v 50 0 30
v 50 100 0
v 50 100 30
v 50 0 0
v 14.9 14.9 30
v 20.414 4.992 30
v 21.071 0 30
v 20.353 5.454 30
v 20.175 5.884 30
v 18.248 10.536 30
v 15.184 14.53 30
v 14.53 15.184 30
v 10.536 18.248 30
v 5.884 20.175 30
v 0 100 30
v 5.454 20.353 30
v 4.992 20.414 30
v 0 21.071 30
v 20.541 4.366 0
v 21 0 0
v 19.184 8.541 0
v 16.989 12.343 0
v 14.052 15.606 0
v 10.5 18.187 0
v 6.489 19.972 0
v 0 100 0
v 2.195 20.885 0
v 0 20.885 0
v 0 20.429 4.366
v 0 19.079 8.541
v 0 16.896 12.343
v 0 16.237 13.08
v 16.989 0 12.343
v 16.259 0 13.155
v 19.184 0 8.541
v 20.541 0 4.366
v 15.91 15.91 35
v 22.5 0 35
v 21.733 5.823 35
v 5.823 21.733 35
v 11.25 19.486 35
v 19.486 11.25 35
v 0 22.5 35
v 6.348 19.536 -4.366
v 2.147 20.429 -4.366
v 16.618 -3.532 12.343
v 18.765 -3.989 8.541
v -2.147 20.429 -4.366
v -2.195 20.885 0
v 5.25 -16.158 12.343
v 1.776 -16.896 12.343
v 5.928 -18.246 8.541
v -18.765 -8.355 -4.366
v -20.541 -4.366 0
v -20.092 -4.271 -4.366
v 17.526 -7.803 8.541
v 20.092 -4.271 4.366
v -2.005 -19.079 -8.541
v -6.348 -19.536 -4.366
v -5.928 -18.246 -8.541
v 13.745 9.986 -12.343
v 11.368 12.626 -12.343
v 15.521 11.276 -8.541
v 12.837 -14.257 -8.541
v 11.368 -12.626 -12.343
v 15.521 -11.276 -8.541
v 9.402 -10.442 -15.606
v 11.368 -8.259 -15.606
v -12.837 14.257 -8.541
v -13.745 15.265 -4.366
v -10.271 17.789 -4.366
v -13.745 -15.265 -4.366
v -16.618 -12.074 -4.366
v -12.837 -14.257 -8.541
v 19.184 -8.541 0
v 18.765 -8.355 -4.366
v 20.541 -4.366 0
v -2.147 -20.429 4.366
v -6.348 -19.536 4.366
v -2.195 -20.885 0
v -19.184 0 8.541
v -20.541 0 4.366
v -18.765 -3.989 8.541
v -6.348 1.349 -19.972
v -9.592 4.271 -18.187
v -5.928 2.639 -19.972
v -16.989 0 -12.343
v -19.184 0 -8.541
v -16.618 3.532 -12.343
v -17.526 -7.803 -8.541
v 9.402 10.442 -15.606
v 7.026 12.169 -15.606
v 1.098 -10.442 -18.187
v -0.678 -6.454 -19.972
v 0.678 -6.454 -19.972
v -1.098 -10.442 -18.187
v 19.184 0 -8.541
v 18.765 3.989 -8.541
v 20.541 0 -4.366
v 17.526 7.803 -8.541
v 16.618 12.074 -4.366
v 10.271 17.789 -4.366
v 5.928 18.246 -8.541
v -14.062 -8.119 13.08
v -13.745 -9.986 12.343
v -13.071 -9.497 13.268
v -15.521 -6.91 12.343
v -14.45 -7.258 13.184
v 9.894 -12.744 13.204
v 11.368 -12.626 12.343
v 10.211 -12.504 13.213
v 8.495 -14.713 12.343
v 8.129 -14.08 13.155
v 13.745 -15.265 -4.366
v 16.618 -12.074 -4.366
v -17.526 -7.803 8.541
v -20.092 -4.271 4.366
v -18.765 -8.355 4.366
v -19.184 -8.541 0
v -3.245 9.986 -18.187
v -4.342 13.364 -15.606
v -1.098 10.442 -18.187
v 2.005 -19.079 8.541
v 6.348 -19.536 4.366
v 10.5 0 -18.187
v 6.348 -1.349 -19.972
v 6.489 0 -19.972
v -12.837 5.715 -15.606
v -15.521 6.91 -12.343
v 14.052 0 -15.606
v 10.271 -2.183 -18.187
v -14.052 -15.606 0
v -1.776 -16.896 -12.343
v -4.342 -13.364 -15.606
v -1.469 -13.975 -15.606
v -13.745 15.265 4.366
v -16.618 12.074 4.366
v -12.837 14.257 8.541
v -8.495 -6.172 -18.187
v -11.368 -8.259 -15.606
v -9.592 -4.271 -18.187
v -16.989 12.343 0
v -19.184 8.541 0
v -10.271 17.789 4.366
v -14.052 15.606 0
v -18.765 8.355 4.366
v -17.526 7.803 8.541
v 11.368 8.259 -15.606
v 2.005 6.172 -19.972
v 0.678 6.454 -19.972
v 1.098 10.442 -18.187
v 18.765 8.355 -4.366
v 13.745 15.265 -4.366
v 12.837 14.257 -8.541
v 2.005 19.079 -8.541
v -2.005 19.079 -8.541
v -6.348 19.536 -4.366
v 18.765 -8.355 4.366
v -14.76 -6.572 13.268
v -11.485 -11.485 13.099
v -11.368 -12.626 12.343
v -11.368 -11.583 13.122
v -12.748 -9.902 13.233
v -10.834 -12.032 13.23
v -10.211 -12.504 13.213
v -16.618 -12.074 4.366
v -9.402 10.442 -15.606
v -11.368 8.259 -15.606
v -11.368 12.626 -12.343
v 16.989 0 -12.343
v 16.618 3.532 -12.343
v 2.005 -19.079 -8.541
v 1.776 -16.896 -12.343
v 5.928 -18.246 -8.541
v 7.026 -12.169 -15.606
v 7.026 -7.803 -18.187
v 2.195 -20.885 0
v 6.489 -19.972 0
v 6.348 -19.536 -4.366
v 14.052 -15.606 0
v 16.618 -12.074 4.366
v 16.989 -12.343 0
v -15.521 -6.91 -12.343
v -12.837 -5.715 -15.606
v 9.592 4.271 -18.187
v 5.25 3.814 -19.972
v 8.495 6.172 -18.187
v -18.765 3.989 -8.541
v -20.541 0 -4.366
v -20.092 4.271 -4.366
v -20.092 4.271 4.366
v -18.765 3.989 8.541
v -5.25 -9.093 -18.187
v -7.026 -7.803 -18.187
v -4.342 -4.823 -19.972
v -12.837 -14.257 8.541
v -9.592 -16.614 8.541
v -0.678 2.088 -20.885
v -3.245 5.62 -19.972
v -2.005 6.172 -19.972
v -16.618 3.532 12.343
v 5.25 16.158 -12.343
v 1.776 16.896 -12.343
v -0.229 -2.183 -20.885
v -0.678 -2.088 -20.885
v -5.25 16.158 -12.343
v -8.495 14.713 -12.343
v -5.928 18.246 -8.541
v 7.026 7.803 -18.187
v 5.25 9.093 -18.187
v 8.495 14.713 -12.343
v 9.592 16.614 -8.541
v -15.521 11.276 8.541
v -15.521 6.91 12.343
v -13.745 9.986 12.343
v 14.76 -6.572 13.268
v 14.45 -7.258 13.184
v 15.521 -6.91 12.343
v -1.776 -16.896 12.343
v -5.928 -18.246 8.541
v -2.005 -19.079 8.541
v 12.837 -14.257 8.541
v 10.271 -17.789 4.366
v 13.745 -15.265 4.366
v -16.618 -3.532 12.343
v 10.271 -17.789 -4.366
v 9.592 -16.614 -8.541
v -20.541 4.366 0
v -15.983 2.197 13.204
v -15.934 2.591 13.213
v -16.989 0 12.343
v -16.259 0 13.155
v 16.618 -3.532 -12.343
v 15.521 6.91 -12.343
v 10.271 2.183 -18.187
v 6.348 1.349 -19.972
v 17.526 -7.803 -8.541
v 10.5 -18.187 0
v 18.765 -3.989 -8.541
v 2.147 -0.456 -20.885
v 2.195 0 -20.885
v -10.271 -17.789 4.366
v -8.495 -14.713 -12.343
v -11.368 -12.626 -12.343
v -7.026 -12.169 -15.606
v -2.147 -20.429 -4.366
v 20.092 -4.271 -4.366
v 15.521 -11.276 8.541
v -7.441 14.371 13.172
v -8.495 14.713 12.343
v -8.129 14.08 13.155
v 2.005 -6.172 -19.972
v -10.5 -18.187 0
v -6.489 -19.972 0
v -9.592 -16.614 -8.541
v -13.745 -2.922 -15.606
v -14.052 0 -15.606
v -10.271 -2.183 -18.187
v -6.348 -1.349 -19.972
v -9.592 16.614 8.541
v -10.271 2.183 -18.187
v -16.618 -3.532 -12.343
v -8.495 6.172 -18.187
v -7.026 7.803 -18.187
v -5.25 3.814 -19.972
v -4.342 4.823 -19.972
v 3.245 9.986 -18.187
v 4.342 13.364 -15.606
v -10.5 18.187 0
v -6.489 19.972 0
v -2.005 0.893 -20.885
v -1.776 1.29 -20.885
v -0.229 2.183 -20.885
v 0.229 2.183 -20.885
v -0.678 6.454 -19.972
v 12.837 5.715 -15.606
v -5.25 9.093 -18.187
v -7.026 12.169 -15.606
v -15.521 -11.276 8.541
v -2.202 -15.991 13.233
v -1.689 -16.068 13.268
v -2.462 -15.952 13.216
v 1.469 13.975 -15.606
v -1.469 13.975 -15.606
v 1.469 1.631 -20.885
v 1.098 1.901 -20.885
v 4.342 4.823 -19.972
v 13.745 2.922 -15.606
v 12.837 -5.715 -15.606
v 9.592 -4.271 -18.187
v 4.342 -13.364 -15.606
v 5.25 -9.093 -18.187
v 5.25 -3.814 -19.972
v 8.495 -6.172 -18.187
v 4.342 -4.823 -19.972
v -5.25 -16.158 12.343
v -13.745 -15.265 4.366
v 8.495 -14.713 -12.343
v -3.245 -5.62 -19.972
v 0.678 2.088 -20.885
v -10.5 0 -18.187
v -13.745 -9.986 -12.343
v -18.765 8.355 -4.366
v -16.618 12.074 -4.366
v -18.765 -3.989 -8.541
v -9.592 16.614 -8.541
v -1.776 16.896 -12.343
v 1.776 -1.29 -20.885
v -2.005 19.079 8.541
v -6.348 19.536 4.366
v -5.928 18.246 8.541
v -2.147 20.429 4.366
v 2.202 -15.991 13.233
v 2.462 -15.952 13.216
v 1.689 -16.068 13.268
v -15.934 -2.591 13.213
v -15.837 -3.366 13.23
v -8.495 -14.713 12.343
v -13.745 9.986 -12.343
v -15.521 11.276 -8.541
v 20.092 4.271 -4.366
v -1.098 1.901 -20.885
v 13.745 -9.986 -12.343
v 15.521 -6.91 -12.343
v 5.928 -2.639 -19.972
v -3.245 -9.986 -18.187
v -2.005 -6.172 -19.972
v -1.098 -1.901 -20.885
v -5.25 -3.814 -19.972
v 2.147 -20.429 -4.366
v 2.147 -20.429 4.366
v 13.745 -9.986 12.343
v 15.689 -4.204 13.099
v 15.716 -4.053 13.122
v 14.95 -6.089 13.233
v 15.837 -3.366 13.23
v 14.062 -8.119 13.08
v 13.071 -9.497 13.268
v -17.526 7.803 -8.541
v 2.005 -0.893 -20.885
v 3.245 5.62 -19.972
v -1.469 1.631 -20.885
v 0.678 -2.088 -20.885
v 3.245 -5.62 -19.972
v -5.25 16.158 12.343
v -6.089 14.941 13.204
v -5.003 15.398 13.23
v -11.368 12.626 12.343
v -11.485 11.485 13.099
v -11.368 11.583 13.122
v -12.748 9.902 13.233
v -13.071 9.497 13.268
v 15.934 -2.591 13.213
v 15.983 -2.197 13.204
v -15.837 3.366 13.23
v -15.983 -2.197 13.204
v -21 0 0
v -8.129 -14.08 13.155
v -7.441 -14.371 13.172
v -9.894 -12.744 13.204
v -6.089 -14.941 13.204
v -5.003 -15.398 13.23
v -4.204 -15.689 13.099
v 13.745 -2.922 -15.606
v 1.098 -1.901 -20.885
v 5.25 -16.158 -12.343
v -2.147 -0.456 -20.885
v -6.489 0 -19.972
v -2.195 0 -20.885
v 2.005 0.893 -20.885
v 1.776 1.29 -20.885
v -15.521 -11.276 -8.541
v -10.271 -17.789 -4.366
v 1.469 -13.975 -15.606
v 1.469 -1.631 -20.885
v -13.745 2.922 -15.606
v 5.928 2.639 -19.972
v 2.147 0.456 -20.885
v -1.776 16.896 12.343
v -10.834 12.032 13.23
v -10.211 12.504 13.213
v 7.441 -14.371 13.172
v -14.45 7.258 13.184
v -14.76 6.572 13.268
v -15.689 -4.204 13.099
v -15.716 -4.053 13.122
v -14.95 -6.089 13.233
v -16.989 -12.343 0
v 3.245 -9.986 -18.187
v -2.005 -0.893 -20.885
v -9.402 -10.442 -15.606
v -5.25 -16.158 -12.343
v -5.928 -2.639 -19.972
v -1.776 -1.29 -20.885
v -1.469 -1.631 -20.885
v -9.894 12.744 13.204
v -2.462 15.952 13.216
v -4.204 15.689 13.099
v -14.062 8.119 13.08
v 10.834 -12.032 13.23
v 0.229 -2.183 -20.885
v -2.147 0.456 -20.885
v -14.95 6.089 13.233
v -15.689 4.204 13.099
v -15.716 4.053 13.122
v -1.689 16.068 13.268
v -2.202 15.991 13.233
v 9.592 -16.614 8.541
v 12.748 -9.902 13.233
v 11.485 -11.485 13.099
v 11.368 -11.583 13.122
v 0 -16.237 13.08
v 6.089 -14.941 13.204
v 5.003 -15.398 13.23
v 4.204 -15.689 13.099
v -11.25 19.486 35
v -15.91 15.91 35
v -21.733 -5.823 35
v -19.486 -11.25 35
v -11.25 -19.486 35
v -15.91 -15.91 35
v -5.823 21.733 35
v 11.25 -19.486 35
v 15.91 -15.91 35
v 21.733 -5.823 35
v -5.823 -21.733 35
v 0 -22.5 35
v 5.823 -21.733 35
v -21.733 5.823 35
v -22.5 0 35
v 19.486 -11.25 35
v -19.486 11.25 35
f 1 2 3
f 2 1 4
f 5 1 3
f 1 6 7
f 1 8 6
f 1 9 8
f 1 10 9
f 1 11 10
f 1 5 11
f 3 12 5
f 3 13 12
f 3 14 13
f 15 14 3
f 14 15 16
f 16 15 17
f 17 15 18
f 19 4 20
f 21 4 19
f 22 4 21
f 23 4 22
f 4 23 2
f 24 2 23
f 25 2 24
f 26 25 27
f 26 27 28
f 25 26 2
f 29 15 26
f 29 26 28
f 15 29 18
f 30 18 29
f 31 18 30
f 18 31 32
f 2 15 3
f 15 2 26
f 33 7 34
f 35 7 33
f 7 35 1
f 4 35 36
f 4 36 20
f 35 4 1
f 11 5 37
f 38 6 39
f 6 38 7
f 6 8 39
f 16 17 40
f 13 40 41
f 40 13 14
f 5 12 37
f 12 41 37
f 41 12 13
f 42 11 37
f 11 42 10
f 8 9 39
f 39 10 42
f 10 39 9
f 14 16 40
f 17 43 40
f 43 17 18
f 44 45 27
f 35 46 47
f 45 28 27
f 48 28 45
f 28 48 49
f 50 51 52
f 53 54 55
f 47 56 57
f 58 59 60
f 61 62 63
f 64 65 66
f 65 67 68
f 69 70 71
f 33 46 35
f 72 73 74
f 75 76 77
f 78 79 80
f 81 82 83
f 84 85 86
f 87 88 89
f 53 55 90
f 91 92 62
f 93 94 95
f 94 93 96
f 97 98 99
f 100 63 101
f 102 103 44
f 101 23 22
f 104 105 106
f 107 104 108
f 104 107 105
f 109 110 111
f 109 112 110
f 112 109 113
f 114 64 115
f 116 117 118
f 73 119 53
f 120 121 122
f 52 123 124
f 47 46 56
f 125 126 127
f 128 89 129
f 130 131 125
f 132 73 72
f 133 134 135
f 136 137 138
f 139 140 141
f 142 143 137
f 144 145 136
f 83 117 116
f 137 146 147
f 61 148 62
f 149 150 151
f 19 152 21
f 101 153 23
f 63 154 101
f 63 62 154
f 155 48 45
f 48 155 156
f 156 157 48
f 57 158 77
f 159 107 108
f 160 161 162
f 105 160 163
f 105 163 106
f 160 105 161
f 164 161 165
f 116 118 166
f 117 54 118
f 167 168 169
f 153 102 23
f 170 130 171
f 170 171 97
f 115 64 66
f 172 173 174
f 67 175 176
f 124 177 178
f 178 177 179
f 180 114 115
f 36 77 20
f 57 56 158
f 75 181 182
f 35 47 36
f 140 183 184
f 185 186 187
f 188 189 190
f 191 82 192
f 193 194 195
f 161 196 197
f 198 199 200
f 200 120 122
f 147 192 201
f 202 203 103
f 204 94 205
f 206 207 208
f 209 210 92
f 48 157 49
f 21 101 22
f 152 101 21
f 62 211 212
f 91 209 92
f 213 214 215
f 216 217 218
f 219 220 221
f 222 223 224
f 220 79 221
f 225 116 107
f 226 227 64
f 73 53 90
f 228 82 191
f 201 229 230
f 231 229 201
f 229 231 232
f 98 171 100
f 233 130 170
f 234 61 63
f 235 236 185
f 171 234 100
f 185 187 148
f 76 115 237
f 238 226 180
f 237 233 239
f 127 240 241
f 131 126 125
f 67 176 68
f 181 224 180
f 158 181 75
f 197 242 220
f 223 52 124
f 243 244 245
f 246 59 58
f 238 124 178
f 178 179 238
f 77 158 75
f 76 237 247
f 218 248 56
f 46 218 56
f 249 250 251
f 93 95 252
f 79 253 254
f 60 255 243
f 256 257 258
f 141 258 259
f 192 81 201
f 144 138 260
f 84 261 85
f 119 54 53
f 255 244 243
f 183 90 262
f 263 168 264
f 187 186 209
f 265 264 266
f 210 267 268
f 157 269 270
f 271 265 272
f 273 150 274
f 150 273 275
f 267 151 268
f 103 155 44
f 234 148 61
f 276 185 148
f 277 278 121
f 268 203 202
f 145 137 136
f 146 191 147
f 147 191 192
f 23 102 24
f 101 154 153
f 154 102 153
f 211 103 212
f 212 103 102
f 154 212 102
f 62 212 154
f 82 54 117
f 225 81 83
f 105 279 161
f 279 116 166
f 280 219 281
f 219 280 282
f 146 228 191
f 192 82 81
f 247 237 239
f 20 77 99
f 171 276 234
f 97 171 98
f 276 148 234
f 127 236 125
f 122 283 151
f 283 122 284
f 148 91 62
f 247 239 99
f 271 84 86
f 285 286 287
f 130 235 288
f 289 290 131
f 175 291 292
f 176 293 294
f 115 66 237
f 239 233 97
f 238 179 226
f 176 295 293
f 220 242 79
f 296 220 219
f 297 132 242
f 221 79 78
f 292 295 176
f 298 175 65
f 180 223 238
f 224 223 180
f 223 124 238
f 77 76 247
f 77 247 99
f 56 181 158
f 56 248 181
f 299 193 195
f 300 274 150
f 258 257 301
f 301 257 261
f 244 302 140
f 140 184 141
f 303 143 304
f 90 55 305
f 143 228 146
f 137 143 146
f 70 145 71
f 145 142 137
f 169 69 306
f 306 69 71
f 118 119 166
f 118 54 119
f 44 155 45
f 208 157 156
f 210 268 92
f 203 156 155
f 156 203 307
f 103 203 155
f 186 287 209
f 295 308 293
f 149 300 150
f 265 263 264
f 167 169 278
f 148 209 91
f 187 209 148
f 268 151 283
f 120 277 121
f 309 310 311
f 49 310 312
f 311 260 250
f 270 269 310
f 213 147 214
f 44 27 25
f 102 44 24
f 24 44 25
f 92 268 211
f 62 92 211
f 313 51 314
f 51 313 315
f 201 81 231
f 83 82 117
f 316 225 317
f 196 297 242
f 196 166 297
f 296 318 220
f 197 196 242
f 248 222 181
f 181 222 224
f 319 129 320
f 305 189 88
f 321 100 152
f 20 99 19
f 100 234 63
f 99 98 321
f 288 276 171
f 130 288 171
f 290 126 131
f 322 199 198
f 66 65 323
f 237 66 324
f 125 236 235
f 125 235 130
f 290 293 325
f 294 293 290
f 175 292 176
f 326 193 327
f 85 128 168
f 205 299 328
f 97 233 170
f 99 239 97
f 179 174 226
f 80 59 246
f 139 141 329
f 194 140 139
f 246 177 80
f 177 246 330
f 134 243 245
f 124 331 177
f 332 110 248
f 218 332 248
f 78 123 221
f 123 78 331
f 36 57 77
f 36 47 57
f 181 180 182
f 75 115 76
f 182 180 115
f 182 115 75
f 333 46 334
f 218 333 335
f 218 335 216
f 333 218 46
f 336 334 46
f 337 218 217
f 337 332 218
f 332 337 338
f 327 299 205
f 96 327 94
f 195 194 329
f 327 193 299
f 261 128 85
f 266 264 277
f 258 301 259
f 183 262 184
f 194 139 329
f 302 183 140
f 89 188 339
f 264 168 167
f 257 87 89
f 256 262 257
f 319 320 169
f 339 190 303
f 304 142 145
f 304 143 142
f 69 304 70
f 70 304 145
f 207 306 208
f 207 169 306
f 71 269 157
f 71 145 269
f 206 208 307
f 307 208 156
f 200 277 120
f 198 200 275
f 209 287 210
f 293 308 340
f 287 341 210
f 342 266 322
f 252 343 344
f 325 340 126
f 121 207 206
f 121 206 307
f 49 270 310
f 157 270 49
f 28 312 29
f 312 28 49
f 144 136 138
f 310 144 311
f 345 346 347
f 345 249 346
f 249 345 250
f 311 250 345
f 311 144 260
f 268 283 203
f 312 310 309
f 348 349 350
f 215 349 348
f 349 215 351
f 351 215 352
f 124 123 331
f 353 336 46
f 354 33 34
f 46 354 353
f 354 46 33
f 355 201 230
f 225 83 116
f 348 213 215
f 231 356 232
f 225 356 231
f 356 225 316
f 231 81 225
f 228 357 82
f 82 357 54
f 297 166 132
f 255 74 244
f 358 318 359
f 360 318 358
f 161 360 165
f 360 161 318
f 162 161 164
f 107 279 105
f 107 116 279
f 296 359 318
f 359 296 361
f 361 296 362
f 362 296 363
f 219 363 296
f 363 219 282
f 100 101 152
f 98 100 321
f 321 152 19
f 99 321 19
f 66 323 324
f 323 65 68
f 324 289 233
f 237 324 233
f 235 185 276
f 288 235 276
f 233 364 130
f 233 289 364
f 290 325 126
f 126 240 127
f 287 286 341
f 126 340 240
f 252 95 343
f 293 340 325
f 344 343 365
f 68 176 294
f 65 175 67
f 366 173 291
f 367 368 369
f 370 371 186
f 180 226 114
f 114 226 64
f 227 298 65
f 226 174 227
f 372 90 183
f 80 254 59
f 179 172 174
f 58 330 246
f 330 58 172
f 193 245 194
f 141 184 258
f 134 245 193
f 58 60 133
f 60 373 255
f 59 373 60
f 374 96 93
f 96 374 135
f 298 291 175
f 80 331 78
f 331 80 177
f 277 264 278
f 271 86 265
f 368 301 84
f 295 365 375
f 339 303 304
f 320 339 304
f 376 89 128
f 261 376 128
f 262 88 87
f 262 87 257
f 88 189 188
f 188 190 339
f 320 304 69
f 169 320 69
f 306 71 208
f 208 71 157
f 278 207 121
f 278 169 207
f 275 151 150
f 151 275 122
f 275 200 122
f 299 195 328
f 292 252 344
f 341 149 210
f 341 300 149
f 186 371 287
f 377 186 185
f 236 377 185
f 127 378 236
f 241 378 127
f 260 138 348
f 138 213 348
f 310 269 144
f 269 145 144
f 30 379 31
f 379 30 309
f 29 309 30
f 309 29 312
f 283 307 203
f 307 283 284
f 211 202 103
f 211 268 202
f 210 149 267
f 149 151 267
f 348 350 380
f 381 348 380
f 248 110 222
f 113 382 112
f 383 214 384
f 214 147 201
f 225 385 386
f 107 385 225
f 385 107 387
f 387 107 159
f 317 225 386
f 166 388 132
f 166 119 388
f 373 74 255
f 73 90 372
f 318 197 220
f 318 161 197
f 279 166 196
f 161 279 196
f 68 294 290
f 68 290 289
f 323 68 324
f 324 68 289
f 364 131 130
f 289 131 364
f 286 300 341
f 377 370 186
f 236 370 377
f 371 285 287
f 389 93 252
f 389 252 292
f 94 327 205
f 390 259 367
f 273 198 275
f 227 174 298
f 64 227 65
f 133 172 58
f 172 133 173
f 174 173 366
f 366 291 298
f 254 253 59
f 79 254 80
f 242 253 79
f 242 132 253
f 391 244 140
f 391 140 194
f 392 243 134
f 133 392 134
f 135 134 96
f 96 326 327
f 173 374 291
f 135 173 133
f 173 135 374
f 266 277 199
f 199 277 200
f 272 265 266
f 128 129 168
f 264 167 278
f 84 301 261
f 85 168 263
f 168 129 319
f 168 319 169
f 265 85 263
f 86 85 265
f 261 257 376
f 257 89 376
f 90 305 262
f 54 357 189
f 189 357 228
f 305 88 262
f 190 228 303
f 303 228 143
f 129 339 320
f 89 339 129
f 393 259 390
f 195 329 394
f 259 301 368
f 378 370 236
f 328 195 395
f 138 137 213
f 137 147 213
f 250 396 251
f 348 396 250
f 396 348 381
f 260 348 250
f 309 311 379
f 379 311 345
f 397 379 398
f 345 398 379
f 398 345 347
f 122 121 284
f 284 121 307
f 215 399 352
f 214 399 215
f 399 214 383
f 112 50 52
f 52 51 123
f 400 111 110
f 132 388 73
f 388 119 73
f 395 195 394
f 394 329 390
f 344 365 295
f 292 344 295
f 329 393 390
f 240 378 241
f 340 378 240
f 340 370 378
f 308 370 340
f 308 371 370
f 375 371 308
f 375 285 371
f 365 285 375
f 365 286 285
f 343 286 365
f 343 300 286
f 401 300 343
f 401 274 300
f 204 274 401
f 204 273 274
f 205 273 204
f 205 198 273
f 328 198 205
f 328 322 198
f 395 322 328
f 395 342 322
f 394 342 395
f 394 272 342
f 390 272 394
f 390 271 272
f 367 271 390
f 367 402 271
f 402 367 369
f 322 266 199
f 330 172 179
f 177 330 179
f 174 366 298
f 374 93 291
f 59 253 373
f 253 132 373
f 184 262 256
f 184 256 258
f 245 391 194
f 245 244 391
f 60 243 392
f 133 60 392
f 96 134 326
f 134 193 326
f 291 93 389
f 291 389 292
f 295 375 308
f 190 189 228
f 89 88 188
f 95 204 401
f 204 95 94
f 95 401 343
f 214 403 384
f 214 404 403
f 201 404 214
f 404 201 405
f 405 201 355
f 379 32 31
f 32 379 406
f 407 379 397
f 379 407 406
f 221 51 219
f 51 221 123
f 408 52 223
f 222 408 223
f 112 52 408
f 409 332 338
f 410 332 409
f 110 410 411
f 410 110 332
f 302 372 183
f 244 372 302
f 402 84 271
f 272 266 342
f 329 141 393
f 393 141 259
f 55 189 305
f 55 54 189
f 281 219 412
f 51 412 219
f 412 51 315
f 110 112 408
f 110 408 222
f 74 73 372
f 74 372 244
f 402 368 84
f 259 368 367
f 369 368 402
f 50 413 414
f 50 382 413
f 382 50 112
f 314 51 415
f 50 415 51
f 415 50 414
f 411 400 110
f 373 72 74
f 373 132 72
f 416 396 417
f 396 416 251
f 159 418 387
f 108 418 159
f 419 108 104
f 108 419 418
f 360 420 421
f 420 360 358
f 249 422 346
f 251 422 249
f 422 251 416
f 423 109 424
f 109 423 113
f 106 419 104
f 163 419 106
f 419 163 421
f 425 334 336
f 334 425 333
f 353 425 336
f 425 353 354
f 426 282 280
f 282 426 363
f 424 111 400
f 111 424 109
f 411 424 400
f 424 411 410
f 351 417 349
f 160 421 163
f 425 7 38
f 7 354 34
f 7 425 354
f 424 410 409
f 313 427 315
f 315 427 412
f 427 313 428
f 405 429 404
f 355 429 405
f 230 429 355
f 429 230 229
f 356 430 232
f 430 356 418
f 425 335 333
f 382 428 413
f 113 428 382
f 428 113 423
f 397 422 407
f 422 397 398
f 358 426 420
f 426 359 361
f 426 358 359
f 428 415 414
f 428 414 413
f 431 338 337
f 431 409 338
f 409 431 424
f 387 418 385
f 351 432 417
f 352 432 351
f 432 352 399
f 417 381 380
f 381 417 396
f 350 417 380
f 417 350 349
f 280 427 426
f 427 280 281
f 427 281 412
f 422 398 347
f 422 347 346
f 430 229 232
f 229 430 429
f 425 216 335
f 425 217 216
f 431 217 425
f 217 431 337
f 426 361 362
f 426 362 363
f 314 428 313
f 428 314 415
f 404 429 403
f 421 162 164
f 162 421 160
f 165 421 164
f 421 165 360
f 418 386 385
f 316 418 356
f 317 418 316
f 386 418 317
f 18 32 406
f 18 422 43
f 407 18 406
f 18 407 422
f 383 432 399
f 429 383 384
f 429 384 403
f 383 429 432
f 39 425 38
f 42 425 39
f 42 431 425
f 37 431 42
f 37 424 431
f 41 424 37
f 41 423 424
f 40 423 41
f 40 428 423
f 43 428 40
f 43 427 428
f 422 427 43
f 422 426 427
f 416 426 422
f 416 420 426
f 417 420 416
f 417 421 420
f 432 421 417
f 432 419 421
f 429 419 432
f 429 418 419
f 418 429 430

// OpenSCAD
// * Discription what the *.scad is about ect.

// ==================================
// = Used Libraries =
// ==================================


// ==================================
// = Variables =
// ==================================

// sizing printing or print a small part to test the object.
DesignStatus="sizing"; // ["sizing","fitting","printing"]
// Variables seen by customizer

TestSlab_X=50;
TestSlab_Y=100;
TestSlab_Z=30;

TestCylinder_H=35;
TestCylinder_D1=25;
TestCylinder_D2=45;

TestSphere_D=42;

module __Customizer_Limit__ () {}  // before these, the variables are usable in the cutomizer
shown_by_customizer = false;




// === Facettes Numbers ===





FN_HexNut=6;
FN_Performance=36;
FN_FooBaa=12;
// Divisebile by 4 to align Cylinders whithout small intersections taht cause problems due to smal holes in surfaches and self intersections on round objects

FN_Rough=12;
FN_MediumRough=16;
FN_Medium=36;
FN_Fine=72;
FN_ExtraFine=144;

// Funktionalety to provide a global switch to set the $fn parameter to lower values to run faster when in development and to set it to heigh and fancy when getting serius about exporting a rocket schaped object to hide in dark spots. 





// ==================================
// = Tuning Variables =
// ==================================
// Variables for finetuning (The Slegehammer if something has to be made fit)

// ==================================
// = Test Stage =
// ==================================

// BLUEPRINT_Enviroment
module MirrorMirrorOnTheWall(Offset_X,Offset_Y){
    translate([-Offset_X,Offset_Y,0]){
        children();
        mirror([0,1,0]){
            children();
        }
    }
    translate([Offset_X,-Offset_Y,0]){
        mirror([1,0,0]){
            children();
            mirror([1,0,0]){
                children();
            }
        }
    }
}
// BLUEPRINT_Enviroment
if (DesignStatus=="printing"){
    intersection(){
        //TEST_OBJECT(FN_ExtraFine);
        cube([1000,1000,1000],center=true);
    }
}
// BLUEPRINT_Enviroment
if(DesignStatus=="fitting"){
    //TEST_OBJECT(FN_FACETTES=FN_MediumRough);
}


// Iterates and coloures the parts distingushable
if (DesignStatus=="sizing"){
// $fn = $preview ? 12 : 72; // Facets in preview (F5) set to 12, in Reder (F6) is set to 72
    see_me_in_colourful(){
        translate([0,0,0]){
            TEST_OBJECT();
        }
        translate([0,0,0]){
        
        }        
        translate([0,0,0]){
            TEST_SPHERE();
        }
        translate([0,0,0]){
        }
        translate([0,0,0]){
            TEST_CUTCYLINDER();
        }
        union(){
            
        }
        translate([ 0,0,0]){
        }
    }
}
// Module to help coloring different modules to make  ist easier
// 
module see_me_in_colourful(){
    //difference(){
        //union(){
          translate([0,0,0]){
            for(i=[0:1:$children-1]){
                a=255;
                b=50;
                k_farbabstand=((a-b)/$children);
                Farbe=((k_farbabstand*i)/255);
                SINUS_Foo=0.5+(sin(((360/(a-b))*k_farbabstand)*(i+1)))/2;
                COSIN_Foo=0.5+(cos(((360/(a-b))*k_farbabstand)*(i+1)))/2;
                color(c = [ SINUS_Foo,
                            1-(SINUS_Foo/2+COSIN_Foo/2),
                            COSIN_Foo],
                            alpha = 0.5){  
                    //MirrorMirrorOnTheWall(0){
                    difference(){
                        //MirrorMirrorOnTheWall(0){
                            render(convexity=20){children(i);}
                            //children(i);
                            translate([70/2,0,0]){
                                    //cube([80,70,150],center=true);
                                }
                        //}
// Creates a Cutting to see a Sidesection cut of the objects
                            color(c = [ SINUS_Foo,
                                1-(SINUS_Foo/2+COSIN_Foo/2),
                                COSIN_Foo],
                                alpha = 0.0){
                                translate([70/2,0,0]){
                                    //cube([10,20,150],center=true);
                                }
                                translate([0,0,0]){
                                    //cube([30,30,200],center=true);
                                    }
                                }
                            }
                        }
                    }
                }
            }
// == Testprints ==

Projection_Cutter(5){
//see_me_half();
}

//// == Cutes a slice of the Objekts
Intersection_Test_Cut("xy",1.5,16){
 //Intersection_Test_Cut( "xy",           // "Plaine xy yz xz", 
                       // 1,              // Slicethickness , 
                        //5,              // Distance from coordinate origin in plaine )
   // OBJECTMODULESHERE 
   //Frame_Base();
}

// ==================================
// = Modus =
// ==================================

 
// ==================================
// = Stage =
// ==================================
// Final module for Produktion

module Assembly(){

}
module TEST_OBJECT(){
    difference(){
        TEST_CUTCUBE(TestSlab_X,TestSlab_Y,TestSlab_Z);
        TEST_CUTCYLINDER();
    }
    TEST_SPHERE();
}

// ===============================================================================
// =--------------------------------- Enviroment Modules ------------------------=
// ===============================================================================
// Modules that resembles the Enviroment aka the helmet where to atach a camera mount


// ===============================================================================
// =--------------------------------- Modules -----------------------------------=
// ===============================================================================
//TEST_OBJECT();

module TEST_CUTCUBE(X=30,Y=60,Z=15){
    cube([X,Y,Z]);
}
module TEST_SPHERE(D=TestSphere_D){
//$fn = $preview ? 12 : 72; // Facets in preview (F5) set to 12, in Reder (F6) is set to 72
    difference(){
        sphere(d=D);
        TEST_CUTCYLINDER();
    }
}
module TEST_CUTCYLINDER(H=TestCylinder_H,D1=TestCylinder_D1,D2=TestCylinder_D2){
    cylinder(h=H,d1=D1,d2=D2,$fn=24);
}

// ===============================================================================
// ---------------------------------- Cutting Modules ----------------------------
// ===============================================================================
// === Half Cutter

//HEX_Mesh_Pattern(){ Mesh(2.5,2.5);}
module HEX_Mesh_Pattern(X=10,Y=30,DELTA=5,GRPL_X=45,GRPL_Y=115){
Count_X=X;
Count_Y=Y;

//DELTA=1;

X_STEPP=5.5+DELTA;
Y_STEPP=7.5+DELTA;

k=DELTA; //Distance between Hexshapes may be HEX_D/4 is good
HEX_D=(GrindingPlate_X-((Count_X-1)*k/2))/(Count_X-1);

SCALE_Y=GrindingPlate_Y/((HEX_D/2+k/4)*sqrt(3)*(Count_Y-1));
echo("HEX_D*Count_Y",HEX_D*(Count_Y));
echo("GrindingPlate_Y",GrindingPlate_Y);
echo("SCALE_Y",SCALE_Y);

//square([15,(HEX_D/2+k/4)*sqrt(3)*(Count_Y-1)]); // Helper Foo
    
// +++++++++++++++++++++++++++++++++++++++++
    scale([1,SCALE_Y,1]){
        union(){
            for(j=[0:1:Count_Y-1]){
                for(i=[0:1:Count_X-1-j%2]){
                    translate([i*(HEX_D+k/2),0,0]){
                        translate([(HEX_D/2+k/4)*(j%2),
                                    j*((HEX_D/2+k/4)*sqrt(3)),
                                    0]                          ){
                        //translate([0,j*Y_STEPP,0]){
                        rotate([0,0,60]){
                            circle(d=HEX_D,$fn=6);
                        }
                            //children();
                        }
                    }
                }
            }
        }
    }
}
//Mesh(5,2);
module Mesh(SHAPEDIMENSION_X=2.5,RADIUS=0.0){
minkowski(){
    circle(SHAPEDIMENSION_X-RADIUS,$fn=6);
    //circle(r=RADIUS,$fn=64);
    }
    //circle(SHAPEDIMENSION_X,$fn=6); // Size Testing
}
//Screwcutter(100,10,100,4,1,5);
module Screwcutter( SCREW_HEAD_h=200,
                    SCREW_HEAD_d=40,
                    SCREW_BOLT_h=200,
                    SCREW_BOLT_d=3,
                    SCREW_CAMPFER_h,
                    SCREW_CAMPFER_d=SCREW_BOLT_d    ){
    translate([0,0,-SCREW_HEAD_h]){
        cylinder(h=SCREW_HEAD_h,d=SCREW_HEAD_d,$fn=32);
    }
    translate([0,0,0]){
        cylinder(h=SCREW_CAMPFER_h,d2=SCREW_BOLT_d,d1=SCREW_CAMPFER_d,$fn=32);    
    }
    translate([0,0,0]){
        cylinder(h=SCREW_BOLT_h,d=SCREW_BOLT_d,$fn=32);
    }
}
//Bolt(25,3,8,3);
module Bolt(BOLTLENGTH,BOLTDIAMETER,HEADDIAMETER,HEADHEIGHT){
    cylinder(h=BOLTLENGTH,d=BOLTDIAMETER,center=false,$fn=FN_Performance);
    translate([0,0,-HEADHEIGHT/2]){
        cylinder(h=HEADHEIGHT,d=HEADDIAMETER,center=true,$fn=6);
        cylinder(h=HEADHEIGHT,d=HEADDIAMETER,center=true,$fn=6);
    }
}
//Projection_Cutter(3){sphere(10);};
module Projection_Cutter(Offset_z){    
    projection(cut = true){
        translate([0,0,Offset_z]){
            children();
        }
    }
}
// ===============================================================================
// ---------------------------------- Intersection Modules -----------------------
// ===============================================================================

module Intersection_Test_Cut(PLAIN,THICKNESS,OFFSET){
// ==== EXAMPLE ====
//    !Intersection_Test_Cut("xy",1,7/2){sphere(7);};
// ==== EXAMPLE ====
    if (PLAIN=="xz"){
        intersection(){
            children();
            translate([0,OFFSET,0]){
                cube([100,THICKNESS,100],center=true);
            }
        }
    }
    else if (PLAIN=="xy") {
        intersection(){
            children();
            translate([0,0,OFFSET]){
                cube([500,500,THICKNESS],center=true);
            }
        }
    }
    else if (PLAIN=="yz") {
        intersection(){
            children();
            translate([OFFSET,0,0]){
                cube([THICKNESS,100,100],center=true);
            }
        }   
    }
}
// ===============================================================================
// ---------------------------------- Linear Extrude Modules ---------------------
// ===============================================================================

//Ring_Shaper(3,15,1.5);
module Ring_Shaper(HEIGHT,OUTER,WALLTHICKNESS){
    linear_extrude(HEIGHT){
        2D_Ring_Shape(OUTER,WALLTHICKNESS);
    }
}

module Linear_Extruding(ExtrudeLength,ExrtudingDirektionInverter){
    Length=ExtrudeLength;
    translate([0,0,Length*ExrtudingDirektionInverter]){
        linear_extrude(height=ExtrudeLength){
            children();
        }
    }
}

// ===============================================================================
// ---------------------------------- Rotate Extrude Modules ---------------------
// ===============================================================================

//DONUT(1,20,1,7);
module DONUT(DIAMETER,DIAMETER_RING,SCAL_X,SCAL_Y){
//DIAMETER The dough part
//DIAMETER_RING The hole part
//SCAL_X, skales the x dimension
//SCAL_Y, skales the y dimension
    rotate_extrude(angle=360,convexity=3,$fn=FN_Fine){
        translate([DIAMETER_RING,0,0]){
            scale([SCAL_X,SCAL_Y,1]){
                circle(d=DIAMETER,$fn=FN_Fine);
            }
        }
    }
}
// ===============================================================================
// =--------------------------------- 2D-Shapes ---------------------------------=
// ===============================================================================

//2D_Ring_Shape(20,1);
module 2D_Ring_Shape(OUTER_D,WALLTHICKNESS){
    difference(){
        circle(d=OUTER_D,$fn=FN_Fine);
        circle(d=OUTER_D-2*WALLTHICKNESS,$fn=FN_Fine);
    }
}
//2D_Rounded_Square_Base_Shape(10,20,3);
module 2D_Rounded_Square_Base_Shape(DIMENSION_X=10,DIMENSION_Y=20,RADIUS=2,CENTER=true){
    if(CENTER){
        translate([0,0,0]){
            minkowski(){
                square([DIMENSION_X-RADIUS*2,DIMENSION_Y-RADIUS*2],center=CENTER);
                circle(r=RADIUS,$fn=FN_Fine);
            }
        }
    }
    else{
        translate([RADIUS,RADIUS,0]){
            minkowski(){
                square([DIMENSION_X-RADIUS*2,DIMENSION_Y-RADIUS*2],center=CENTER);
                circle(r=RADIUS,$fn=FN_Fine);
            }
        }
    }
}
// ===============================================================================
// =--------------------------------- Symetrie Helper ---------------------------=
// ===============================================================================
//XY_Symetrie(10,25){cube(10);}
module XY_Symetrie(X=10,Y=25){
   translate([X,Y,0]){
       children();
       }
    mirror([1,0,0]){
        translate([X,Y,0]){
            children();
       }
    }
    mirror([0,1,0]){
        translate([X,Y,0]){
            children();
        }
        mirror([1,0,0]){
            translate([X,Y,0]){
                children();
            }
        }
    }
}
// ===============================================================================
// =--------------------------------- Textembossing -----------------------------=
// ===============================================================================


// ===============================================================================
// =--------------------------------- Smoothing ---------------------------------=
// ===============================================================================

2D_Smooth_r=1;
// Radius of a outer Tip Rounding 
2D_Fillet_r=1;
// Radius of a inner corner Ronding
2D_Chamfer_DELTA_INN=1;
2D_Chamfer_DELTA_OUT=2;

// a straigt line on edges and corners
2D_Chamfer_BOOLEAN=false;

    
module Smooth(r=3){
    //$fn=30;
    offset(r=r,$fn=30){
        offset(r=-r,$fn=30){
        children();
        }
    }
}
module Fillet(r=3){
    //$fn=30;
    offset(r=-r,$fn=30){
        offset(r=r,$fn=30){
            children();
        }
    }
}
module Chamfer_OUTWARD(DELTA_OUT=3){
    //$fn=30;
    offset(delta=DELTA_OUT,chamfer=true,$fn=30){
        offset(delta=-DELTA_OUT,chamfer=true, $fn=30){
            children();
        }
    }
}
module Chamfer_INWARD(DELTA_INN=3){
    //$fn=30;
    offset(delta=-DELTA_INN,chamfer=true,$fn=30){
        offset(delta=DELTA_INN,chamfer=true, $fn=30){
            children();
        }
    }
}

// ===============================================================================
// =--------------------------------- Ruthex --------------------------------=
// ===============================================================================
// Dimensions for Ruthex Tread inseerts

//RUTHEX_M3();
module RUTHEX_M3(){    
L=5.7+5.7*0.25; // Length + Margin
echo("RUTHEX",L);
D1=4.0;    
    translate([0,0,0]){
        rotate([0,0,0]){
            translate([0,0,0]){
                cylinder(h=L,d1=D1,d2=D1,$fn=FN_Performance);
            }
        }
    }
}

// ===============================================================================
// =--------------------------------- Import STL --------------------------------=
// ===============================================================================

module NAME_OF_IMPORT(){
    rotate([0,0,-90]){
        translate([-515,-100,-45]){
            import("PATH/TO/FILE.stl",convexity=3);
        }
    }
}

// ===============================================================================
// =--------------------------------- Import PNG --------------------------------=
// ===============================================================================

module NAME_OF_IMPORT(){
    rotate([0,0,-90]){
        translate([-515,-100,-45]){
            import("PATH/TO/FILE.PNG",convexity=3);
        }
    }
}
